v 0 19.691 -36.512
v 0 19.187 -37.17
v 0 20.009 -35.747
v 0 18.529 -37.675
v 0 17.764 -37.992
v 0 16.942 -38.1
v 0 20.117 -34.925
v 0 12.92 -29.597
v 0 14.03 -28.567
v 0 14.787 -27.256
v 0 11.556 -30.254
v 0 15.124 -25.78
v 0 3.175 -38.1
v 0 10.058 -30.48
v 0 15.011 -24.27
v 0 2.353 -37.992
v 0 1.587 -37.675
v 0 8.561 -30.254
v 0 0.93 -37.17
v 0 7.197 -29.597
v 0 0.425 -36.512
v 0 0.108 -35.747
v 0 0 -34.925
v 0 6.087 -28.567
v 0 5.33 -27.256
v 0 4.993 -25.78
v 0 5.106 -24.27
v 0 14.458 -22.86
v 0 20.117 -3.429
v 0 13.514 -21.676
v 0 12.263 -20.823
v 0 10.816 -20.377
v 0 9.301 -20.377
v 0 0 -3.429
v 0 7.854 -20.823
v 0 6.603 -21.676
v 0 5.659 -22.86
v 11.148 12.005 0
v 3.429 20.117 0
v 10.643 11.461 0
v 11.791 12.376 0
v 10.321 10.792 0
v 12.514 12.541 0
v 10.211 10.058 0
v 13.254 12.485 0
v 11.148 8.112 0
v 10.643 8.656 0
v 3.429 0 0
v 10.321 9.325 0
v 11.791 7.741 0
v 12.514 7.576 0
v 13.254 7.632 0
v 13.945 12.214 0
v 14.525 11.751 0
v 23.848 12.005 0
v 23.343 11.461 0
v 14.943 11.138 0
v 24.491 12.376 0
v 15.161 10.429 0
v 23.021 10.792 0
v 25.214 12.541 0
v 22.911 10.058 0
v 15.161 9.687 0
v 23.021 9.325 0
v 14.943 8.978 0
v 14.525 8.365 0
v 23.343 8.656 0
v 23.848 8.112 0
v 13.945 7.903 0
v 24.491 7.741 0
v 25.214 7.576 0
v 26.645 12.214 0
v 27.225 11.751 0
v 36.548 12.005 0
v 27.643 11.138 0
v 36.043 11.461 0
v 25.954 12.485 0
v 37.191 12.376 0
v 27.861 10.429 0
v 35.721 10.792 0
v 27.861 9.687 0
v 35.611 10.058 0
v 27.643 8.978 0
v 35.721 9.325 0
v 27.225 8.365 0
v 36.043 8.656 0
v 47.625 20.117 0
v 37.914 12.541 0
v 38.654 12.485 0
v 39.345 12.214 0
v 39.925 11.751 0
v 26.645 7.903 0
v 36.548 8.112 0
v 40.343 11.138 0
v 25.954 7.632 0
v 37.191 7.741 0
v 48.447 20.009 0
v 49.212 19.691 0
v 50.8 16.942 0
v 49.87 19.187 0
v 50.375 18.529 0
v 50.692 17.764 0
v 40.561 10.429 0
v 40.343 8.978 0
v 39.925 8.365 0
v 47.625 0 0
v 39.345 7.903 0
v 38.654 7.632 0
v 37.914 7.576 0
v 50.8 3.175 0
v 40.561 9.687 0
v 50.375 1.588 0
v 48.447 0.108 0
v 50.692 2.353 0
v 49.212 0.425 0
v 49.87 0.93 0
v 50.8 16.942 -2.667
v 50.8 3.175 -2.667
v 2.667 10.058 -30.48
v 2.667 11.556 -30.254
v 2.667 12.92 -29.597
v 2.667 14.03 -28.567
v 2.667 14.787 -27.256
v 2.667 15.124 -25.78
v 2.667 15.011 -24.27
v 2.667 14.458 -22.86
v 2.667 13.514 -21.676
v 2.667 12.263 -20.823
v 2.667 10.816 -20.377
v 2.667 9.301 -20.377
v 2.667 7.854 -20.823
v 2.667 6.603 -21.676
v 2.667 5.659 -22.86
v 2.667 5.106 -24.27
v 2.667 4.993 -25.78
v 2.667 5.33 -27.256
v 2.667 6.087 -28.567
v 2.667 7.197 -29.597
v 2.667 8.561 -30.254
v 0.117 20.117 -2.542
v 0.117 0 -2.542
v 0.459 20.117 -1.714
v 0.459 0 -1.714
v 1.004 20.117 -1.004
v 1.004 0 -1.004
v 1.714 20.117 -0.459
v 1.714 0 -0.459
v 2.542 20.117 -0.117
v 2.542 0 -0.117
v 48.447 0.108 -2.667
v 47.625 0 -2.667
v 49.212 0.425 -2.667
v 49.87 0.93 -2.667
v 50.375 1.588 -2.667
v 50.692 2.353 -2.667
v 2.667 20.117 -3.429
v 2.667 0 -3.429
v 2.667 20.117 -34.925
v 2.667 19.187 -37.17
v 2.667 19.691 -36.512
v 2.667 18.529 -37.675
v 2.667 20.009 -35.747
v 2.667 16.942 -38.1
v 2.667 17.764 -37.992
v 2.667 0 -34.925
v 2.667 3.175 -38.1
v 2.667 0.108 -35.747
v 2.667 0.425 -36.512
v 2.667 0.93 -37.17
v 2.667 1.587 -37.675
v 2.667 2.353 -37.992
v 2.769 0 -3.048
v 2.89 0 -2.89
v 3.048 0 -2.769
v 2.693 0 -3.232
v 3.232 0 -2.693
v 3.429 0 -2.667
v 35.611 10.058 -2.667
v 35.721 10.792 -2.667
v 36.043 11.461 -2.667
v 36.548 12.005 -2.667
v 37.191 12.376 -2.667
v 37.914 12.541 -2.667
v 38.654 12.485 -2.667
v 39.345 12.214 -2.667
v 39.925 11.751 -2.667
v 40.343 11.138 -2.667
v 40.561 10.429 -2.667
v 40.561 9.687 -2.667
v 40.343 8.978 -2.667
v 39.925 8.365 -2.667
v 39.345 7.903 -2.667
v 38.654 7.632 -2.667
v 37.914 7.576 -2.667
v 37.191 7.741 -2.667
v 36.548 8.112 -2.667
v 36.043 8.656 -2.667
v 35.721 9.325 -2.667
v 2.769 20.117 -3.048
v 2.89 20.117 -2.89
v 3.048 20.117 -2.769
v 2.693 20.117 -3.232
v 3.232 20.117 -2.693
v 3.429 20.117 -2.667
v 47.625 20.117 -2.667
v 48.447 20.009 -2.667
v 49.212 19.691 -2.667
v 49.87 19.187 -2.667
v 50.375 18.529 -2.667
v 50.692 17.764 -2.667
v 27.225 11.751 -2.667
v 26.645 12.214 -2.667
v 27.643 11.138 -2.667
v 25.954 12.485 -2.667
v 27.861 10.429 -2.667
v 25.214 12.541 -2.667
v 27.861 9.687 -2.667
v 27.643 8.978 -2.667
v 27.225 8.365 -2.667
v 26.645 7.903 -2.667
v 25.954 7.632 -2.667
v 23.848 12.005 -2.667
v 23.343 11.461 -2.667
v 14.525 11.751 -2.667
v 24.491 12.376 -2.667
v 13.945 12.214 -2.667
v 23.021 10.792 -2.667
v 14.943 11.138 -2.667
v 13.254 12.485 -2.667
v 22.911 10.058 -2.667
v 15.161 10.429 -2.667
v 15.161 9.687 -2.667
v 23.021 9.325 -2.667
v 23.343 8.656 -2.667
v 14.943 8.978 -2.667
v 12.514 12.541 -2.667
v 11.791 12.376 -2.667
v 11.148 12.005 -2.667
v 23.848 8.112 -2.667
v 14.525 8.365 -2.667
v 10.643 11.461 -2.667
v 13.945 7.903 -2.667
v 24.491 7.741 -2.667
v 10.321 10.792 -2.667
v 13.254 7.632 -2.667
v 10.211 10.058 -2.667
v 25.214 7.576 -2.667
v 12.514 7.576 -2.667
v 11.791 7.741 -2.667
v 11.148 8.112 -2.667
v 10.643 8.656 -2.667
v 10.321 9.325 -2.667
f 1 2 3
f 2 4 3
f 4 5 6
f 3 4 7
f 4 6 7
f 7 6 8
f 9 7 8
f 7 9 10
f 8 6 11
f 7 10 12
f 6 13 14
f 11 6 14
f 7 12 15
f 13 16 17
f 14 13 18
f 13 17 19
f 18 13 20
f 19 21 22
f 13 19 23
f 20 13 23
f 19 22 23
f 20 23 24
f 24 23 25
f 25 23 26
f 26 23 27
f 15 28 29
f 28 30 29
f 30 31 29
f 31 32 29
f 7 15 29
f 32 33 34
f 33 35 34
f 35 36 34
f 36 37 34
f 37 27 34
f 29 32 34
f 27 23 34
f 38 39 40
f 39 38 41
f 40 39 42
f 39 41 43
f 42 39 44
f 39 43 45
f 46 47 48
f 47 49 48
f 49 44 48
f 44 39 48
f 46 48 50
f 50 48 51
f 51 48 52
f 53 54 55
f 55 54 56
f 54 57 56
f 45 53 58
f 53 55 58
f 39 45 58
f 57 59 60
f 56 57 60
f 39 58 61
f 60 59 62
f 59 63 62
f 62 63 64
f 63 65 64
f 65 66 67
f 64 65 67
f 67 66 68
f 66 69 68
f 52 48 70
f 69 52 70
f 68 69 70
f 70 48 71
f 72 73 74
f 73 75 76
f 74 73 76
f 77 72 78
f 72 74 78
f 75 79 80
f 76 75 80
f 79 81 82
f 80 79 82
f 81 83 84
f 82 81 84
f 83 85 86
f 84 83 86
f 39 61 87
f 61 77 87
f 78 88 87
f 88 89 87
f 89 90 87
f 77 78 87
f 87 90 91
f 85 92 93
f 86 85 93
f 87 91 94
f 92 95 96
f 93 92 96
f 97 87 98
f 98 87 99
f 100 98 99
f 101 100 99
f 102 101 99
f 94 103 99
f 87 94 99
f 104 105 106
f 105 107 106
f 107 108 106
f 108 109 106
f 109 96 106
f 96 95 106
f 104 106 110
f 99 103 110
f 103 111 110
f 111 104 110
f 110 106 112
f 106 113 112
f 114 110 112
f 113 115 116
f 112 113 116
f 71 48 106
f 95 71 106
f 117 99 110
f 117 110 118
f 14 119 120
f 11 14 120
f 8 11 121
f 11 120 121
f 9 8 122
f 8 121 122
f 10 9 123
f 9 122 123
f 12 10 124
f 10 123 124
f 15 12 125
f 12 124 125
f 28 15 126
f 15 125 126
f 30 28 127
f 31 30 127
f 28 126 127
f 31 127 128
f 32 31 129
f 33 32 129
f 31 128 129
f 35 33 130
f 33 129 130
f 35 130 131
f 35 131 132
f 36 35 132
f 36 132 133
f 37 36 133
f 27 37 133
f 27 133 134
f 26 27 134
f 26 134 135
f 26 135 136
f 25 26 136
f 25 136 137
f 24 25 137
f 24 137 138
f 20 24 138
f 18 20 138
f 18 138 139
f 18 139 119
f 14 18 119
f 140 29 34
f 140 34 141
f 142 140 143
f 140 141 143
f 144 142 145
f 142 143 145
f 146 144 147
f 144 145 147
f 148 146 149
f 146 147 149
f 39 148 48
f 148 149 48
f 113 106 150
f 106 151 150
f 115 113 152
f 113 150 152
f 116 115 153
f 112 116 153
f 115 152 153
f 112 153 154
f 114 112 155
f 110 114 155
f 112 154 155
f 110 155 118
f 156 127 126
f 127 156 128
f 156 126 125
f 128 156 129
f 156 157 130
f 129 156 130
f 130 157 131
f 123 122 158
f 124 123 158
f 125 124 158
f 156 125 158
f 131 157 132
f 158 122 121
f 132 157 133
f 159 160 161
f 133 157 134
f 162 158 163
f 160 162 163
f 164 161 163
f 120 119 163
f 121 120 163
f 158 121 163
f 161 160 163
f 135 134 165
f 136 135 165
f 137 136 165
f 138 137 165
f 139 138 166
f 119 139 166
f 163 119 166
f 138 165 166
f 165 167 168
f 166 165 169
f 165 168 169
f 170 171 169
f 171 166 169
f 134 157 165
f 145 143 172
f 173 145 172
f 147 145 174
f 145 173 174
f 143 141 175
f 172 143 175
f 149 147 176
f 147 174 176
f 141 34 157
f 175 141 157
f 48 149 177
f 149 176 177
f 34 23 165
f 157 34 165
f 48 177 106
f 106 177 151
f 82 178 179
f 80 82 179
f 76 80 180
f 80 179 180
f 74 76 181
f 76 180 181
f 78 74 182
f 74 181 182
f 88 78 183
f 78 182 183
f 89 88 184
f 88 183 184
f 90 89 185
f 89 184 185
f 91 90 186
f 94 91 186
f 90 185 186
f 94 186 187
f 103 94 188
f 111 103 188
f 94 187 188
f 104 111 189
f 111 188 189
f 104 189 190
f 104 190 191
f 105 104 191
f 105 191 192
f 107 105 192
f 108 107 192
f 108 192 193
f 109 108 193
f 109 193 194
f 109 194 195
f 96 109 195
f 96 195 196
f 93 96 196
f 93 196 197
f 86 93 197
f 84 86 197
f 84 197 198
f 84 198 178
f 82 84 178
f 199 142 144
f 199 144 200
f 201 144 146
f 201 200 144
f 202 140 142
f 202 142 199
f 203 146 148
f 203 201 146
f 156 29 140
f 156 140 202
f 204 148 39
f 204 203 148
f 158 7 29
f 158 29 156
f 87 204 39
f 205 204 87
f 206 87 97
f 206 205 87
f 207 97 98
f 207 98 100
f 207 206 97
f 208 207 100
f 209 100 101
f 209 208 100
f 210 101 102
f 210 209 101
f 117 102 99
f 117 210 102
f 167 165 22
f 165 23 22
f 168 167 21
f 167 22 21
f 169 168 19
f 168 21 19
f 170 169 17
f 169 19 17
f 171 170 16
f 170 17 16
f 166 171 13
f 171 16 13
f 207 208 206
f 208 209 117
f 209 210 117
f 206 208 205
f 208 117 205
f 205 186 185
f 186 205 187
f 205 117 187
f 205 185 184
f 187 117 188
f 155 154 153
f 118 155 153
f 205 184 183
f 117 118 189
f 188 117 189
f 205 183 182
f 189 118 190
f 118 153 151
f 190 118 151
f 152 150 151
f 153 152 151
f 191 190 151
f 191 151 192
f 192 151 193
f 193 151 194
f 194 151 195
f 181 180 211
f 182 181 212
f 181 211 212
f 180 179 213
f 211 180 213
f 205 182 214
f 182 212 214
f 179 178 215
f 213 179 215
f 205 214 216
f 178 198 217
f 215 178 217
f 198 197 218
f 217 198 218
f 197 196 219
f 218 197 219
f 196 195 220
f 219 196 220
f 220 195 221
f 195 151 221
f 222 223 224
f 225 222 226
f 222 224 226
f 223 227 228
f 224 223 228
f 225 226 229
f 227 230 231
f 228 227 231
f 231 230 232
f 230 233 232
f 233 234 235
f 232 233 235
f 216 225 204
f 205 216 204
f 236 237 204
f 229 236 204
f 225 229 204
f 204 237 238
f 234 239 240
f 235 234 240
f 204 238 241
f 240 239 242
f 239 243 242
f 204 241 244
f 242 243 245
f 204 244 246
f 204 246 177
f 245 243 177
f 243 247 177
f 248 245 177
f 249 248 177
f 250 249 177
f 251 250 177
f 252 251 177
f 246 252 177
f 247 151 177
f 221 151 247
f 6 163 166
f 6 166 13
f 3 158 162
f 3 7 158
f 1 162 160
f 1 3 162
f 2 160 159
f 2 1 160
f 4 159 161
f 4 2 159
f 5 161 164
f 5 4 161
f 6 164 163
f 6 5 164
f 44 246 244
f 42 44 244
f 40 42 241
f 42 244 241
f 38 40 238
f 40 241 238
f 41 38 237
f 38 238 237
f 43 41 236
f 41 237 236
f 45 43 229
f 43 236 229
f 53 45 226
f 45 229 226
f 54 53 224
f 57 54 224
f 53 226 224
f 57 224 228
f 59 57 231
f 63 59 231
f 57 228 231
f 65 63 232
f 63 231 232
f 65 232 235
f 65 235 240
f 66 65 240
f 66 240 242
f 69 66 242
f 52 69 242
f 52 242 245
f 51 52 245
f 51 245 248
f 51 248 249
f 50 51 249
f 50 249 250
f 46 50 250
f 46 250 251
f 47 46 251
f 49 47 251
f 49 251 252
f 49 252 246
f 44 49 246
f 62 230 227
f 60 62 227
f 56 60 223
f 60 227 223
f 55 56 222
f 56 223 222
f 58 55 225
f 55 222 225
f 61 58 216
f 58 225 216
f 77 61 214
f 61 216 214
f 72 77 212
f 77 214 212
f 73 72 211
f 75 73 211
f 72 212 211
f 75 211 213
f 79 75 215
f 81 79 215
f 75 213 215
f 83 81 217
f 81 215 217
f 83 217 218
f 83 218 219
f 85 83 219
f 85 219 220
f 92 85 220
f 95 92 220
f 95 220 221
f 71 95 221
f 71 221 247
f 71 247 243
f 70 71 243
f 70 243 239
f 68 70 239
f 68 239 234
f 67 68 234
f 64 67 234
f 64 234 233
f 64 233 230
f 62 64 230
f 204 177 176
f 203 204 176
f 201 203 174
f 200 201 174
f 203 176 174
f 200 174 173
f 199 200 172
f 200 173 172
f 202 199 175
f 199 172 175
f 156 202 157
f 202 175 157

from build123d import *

# Parameters (mm, degrees)
BASE_FLANGE1_DEPTH = 20.1168
SKETCH6_R          = 2.4892
CUT_EXTRUDE1_DEPTH = 66.121602646
SKETCH7_R          = 5.08
CUT_EXTRUDE2_DEPTH = 65.599391106
FILLET1_R          = 3.175


# Read off the part's stored shape, not the designer's step: Base-Flange1
with BuildPart() as part:
    # Base-Flange1 outline → Base-Flange1 (new body)
    with BuildSketch(Plane(origin=(0, 0, 0), x_dir=(1, 0, 0), z_dir=(0, 1, 0))):
        with BuildLine():
            Line((3.429, 0), (50.8, 0))
            Line((50.8, 0), (50.8, 2.667))
            Line((50.8, 2.667), (3.429, 2.667))
            ThreePointArc((3.429, 2.667), (2.890184633, 2.890184633), (2.667, 3.429))
            Line((2.667, 3.429), (2.667, 38.1))
            Line((2.667, 38.1), (0, 38.1))
            Line((0, 38.1), (0, 3.429))
            ThreePointArc((0, 3.429), (1.004330847, 1.004330847), (3.429, 0))
        make_face()
    extrude(amount=BASE_FLANGE1_DEPTH)

    # Sketch6 → Cut-Extrude1 (cut, through all)
    with BuildSketch(Plane(origin=(0, 0, -2.667), x_dir=(-1, 0, 0), z_dir=(0, 0, -1))):
        with Locations((-38.1, 10.0584)):
            Circle(SKETCH6_R)
        with Locations((-25.4, 10.0584)):
            Circle(SKETCH6_R)
        with Locations((-12.7, 10.0584)):
            Circle(SKETCH6_R)
    extrude(amount=-CUT_EXTRUDE1_DEPTH, mode=Mode.SUBTRACT)

    # Sketch7 → Cut-Extrude2 (cut, through all)
    with BuildSketch(Plane(origin=(2.667, 0, 0), x_dir=(0, 0, -1), z_dir=(1, 0, 0))):
        with Locations((25.4, 10.0584)):
            Circle(SKETCH7_R)
    extrude(amount=-CUT_EXTRUDE2_DEPTH, mode=Mode.SUBTRACT)

    # Fillet1
    fillet1_edges = [part.edges().sort_by_distance(p)[0] for p in [
        (1.3335, 20.1168, -38.1),
        (1.3335, 0, -38.1),
        (50.8, 20.1168, -1.3335),
        (50.8, 0, -1.3335),
    ]]
    fillet(fillet1_edges, radius=FILLET1_R)


solid = part.part
